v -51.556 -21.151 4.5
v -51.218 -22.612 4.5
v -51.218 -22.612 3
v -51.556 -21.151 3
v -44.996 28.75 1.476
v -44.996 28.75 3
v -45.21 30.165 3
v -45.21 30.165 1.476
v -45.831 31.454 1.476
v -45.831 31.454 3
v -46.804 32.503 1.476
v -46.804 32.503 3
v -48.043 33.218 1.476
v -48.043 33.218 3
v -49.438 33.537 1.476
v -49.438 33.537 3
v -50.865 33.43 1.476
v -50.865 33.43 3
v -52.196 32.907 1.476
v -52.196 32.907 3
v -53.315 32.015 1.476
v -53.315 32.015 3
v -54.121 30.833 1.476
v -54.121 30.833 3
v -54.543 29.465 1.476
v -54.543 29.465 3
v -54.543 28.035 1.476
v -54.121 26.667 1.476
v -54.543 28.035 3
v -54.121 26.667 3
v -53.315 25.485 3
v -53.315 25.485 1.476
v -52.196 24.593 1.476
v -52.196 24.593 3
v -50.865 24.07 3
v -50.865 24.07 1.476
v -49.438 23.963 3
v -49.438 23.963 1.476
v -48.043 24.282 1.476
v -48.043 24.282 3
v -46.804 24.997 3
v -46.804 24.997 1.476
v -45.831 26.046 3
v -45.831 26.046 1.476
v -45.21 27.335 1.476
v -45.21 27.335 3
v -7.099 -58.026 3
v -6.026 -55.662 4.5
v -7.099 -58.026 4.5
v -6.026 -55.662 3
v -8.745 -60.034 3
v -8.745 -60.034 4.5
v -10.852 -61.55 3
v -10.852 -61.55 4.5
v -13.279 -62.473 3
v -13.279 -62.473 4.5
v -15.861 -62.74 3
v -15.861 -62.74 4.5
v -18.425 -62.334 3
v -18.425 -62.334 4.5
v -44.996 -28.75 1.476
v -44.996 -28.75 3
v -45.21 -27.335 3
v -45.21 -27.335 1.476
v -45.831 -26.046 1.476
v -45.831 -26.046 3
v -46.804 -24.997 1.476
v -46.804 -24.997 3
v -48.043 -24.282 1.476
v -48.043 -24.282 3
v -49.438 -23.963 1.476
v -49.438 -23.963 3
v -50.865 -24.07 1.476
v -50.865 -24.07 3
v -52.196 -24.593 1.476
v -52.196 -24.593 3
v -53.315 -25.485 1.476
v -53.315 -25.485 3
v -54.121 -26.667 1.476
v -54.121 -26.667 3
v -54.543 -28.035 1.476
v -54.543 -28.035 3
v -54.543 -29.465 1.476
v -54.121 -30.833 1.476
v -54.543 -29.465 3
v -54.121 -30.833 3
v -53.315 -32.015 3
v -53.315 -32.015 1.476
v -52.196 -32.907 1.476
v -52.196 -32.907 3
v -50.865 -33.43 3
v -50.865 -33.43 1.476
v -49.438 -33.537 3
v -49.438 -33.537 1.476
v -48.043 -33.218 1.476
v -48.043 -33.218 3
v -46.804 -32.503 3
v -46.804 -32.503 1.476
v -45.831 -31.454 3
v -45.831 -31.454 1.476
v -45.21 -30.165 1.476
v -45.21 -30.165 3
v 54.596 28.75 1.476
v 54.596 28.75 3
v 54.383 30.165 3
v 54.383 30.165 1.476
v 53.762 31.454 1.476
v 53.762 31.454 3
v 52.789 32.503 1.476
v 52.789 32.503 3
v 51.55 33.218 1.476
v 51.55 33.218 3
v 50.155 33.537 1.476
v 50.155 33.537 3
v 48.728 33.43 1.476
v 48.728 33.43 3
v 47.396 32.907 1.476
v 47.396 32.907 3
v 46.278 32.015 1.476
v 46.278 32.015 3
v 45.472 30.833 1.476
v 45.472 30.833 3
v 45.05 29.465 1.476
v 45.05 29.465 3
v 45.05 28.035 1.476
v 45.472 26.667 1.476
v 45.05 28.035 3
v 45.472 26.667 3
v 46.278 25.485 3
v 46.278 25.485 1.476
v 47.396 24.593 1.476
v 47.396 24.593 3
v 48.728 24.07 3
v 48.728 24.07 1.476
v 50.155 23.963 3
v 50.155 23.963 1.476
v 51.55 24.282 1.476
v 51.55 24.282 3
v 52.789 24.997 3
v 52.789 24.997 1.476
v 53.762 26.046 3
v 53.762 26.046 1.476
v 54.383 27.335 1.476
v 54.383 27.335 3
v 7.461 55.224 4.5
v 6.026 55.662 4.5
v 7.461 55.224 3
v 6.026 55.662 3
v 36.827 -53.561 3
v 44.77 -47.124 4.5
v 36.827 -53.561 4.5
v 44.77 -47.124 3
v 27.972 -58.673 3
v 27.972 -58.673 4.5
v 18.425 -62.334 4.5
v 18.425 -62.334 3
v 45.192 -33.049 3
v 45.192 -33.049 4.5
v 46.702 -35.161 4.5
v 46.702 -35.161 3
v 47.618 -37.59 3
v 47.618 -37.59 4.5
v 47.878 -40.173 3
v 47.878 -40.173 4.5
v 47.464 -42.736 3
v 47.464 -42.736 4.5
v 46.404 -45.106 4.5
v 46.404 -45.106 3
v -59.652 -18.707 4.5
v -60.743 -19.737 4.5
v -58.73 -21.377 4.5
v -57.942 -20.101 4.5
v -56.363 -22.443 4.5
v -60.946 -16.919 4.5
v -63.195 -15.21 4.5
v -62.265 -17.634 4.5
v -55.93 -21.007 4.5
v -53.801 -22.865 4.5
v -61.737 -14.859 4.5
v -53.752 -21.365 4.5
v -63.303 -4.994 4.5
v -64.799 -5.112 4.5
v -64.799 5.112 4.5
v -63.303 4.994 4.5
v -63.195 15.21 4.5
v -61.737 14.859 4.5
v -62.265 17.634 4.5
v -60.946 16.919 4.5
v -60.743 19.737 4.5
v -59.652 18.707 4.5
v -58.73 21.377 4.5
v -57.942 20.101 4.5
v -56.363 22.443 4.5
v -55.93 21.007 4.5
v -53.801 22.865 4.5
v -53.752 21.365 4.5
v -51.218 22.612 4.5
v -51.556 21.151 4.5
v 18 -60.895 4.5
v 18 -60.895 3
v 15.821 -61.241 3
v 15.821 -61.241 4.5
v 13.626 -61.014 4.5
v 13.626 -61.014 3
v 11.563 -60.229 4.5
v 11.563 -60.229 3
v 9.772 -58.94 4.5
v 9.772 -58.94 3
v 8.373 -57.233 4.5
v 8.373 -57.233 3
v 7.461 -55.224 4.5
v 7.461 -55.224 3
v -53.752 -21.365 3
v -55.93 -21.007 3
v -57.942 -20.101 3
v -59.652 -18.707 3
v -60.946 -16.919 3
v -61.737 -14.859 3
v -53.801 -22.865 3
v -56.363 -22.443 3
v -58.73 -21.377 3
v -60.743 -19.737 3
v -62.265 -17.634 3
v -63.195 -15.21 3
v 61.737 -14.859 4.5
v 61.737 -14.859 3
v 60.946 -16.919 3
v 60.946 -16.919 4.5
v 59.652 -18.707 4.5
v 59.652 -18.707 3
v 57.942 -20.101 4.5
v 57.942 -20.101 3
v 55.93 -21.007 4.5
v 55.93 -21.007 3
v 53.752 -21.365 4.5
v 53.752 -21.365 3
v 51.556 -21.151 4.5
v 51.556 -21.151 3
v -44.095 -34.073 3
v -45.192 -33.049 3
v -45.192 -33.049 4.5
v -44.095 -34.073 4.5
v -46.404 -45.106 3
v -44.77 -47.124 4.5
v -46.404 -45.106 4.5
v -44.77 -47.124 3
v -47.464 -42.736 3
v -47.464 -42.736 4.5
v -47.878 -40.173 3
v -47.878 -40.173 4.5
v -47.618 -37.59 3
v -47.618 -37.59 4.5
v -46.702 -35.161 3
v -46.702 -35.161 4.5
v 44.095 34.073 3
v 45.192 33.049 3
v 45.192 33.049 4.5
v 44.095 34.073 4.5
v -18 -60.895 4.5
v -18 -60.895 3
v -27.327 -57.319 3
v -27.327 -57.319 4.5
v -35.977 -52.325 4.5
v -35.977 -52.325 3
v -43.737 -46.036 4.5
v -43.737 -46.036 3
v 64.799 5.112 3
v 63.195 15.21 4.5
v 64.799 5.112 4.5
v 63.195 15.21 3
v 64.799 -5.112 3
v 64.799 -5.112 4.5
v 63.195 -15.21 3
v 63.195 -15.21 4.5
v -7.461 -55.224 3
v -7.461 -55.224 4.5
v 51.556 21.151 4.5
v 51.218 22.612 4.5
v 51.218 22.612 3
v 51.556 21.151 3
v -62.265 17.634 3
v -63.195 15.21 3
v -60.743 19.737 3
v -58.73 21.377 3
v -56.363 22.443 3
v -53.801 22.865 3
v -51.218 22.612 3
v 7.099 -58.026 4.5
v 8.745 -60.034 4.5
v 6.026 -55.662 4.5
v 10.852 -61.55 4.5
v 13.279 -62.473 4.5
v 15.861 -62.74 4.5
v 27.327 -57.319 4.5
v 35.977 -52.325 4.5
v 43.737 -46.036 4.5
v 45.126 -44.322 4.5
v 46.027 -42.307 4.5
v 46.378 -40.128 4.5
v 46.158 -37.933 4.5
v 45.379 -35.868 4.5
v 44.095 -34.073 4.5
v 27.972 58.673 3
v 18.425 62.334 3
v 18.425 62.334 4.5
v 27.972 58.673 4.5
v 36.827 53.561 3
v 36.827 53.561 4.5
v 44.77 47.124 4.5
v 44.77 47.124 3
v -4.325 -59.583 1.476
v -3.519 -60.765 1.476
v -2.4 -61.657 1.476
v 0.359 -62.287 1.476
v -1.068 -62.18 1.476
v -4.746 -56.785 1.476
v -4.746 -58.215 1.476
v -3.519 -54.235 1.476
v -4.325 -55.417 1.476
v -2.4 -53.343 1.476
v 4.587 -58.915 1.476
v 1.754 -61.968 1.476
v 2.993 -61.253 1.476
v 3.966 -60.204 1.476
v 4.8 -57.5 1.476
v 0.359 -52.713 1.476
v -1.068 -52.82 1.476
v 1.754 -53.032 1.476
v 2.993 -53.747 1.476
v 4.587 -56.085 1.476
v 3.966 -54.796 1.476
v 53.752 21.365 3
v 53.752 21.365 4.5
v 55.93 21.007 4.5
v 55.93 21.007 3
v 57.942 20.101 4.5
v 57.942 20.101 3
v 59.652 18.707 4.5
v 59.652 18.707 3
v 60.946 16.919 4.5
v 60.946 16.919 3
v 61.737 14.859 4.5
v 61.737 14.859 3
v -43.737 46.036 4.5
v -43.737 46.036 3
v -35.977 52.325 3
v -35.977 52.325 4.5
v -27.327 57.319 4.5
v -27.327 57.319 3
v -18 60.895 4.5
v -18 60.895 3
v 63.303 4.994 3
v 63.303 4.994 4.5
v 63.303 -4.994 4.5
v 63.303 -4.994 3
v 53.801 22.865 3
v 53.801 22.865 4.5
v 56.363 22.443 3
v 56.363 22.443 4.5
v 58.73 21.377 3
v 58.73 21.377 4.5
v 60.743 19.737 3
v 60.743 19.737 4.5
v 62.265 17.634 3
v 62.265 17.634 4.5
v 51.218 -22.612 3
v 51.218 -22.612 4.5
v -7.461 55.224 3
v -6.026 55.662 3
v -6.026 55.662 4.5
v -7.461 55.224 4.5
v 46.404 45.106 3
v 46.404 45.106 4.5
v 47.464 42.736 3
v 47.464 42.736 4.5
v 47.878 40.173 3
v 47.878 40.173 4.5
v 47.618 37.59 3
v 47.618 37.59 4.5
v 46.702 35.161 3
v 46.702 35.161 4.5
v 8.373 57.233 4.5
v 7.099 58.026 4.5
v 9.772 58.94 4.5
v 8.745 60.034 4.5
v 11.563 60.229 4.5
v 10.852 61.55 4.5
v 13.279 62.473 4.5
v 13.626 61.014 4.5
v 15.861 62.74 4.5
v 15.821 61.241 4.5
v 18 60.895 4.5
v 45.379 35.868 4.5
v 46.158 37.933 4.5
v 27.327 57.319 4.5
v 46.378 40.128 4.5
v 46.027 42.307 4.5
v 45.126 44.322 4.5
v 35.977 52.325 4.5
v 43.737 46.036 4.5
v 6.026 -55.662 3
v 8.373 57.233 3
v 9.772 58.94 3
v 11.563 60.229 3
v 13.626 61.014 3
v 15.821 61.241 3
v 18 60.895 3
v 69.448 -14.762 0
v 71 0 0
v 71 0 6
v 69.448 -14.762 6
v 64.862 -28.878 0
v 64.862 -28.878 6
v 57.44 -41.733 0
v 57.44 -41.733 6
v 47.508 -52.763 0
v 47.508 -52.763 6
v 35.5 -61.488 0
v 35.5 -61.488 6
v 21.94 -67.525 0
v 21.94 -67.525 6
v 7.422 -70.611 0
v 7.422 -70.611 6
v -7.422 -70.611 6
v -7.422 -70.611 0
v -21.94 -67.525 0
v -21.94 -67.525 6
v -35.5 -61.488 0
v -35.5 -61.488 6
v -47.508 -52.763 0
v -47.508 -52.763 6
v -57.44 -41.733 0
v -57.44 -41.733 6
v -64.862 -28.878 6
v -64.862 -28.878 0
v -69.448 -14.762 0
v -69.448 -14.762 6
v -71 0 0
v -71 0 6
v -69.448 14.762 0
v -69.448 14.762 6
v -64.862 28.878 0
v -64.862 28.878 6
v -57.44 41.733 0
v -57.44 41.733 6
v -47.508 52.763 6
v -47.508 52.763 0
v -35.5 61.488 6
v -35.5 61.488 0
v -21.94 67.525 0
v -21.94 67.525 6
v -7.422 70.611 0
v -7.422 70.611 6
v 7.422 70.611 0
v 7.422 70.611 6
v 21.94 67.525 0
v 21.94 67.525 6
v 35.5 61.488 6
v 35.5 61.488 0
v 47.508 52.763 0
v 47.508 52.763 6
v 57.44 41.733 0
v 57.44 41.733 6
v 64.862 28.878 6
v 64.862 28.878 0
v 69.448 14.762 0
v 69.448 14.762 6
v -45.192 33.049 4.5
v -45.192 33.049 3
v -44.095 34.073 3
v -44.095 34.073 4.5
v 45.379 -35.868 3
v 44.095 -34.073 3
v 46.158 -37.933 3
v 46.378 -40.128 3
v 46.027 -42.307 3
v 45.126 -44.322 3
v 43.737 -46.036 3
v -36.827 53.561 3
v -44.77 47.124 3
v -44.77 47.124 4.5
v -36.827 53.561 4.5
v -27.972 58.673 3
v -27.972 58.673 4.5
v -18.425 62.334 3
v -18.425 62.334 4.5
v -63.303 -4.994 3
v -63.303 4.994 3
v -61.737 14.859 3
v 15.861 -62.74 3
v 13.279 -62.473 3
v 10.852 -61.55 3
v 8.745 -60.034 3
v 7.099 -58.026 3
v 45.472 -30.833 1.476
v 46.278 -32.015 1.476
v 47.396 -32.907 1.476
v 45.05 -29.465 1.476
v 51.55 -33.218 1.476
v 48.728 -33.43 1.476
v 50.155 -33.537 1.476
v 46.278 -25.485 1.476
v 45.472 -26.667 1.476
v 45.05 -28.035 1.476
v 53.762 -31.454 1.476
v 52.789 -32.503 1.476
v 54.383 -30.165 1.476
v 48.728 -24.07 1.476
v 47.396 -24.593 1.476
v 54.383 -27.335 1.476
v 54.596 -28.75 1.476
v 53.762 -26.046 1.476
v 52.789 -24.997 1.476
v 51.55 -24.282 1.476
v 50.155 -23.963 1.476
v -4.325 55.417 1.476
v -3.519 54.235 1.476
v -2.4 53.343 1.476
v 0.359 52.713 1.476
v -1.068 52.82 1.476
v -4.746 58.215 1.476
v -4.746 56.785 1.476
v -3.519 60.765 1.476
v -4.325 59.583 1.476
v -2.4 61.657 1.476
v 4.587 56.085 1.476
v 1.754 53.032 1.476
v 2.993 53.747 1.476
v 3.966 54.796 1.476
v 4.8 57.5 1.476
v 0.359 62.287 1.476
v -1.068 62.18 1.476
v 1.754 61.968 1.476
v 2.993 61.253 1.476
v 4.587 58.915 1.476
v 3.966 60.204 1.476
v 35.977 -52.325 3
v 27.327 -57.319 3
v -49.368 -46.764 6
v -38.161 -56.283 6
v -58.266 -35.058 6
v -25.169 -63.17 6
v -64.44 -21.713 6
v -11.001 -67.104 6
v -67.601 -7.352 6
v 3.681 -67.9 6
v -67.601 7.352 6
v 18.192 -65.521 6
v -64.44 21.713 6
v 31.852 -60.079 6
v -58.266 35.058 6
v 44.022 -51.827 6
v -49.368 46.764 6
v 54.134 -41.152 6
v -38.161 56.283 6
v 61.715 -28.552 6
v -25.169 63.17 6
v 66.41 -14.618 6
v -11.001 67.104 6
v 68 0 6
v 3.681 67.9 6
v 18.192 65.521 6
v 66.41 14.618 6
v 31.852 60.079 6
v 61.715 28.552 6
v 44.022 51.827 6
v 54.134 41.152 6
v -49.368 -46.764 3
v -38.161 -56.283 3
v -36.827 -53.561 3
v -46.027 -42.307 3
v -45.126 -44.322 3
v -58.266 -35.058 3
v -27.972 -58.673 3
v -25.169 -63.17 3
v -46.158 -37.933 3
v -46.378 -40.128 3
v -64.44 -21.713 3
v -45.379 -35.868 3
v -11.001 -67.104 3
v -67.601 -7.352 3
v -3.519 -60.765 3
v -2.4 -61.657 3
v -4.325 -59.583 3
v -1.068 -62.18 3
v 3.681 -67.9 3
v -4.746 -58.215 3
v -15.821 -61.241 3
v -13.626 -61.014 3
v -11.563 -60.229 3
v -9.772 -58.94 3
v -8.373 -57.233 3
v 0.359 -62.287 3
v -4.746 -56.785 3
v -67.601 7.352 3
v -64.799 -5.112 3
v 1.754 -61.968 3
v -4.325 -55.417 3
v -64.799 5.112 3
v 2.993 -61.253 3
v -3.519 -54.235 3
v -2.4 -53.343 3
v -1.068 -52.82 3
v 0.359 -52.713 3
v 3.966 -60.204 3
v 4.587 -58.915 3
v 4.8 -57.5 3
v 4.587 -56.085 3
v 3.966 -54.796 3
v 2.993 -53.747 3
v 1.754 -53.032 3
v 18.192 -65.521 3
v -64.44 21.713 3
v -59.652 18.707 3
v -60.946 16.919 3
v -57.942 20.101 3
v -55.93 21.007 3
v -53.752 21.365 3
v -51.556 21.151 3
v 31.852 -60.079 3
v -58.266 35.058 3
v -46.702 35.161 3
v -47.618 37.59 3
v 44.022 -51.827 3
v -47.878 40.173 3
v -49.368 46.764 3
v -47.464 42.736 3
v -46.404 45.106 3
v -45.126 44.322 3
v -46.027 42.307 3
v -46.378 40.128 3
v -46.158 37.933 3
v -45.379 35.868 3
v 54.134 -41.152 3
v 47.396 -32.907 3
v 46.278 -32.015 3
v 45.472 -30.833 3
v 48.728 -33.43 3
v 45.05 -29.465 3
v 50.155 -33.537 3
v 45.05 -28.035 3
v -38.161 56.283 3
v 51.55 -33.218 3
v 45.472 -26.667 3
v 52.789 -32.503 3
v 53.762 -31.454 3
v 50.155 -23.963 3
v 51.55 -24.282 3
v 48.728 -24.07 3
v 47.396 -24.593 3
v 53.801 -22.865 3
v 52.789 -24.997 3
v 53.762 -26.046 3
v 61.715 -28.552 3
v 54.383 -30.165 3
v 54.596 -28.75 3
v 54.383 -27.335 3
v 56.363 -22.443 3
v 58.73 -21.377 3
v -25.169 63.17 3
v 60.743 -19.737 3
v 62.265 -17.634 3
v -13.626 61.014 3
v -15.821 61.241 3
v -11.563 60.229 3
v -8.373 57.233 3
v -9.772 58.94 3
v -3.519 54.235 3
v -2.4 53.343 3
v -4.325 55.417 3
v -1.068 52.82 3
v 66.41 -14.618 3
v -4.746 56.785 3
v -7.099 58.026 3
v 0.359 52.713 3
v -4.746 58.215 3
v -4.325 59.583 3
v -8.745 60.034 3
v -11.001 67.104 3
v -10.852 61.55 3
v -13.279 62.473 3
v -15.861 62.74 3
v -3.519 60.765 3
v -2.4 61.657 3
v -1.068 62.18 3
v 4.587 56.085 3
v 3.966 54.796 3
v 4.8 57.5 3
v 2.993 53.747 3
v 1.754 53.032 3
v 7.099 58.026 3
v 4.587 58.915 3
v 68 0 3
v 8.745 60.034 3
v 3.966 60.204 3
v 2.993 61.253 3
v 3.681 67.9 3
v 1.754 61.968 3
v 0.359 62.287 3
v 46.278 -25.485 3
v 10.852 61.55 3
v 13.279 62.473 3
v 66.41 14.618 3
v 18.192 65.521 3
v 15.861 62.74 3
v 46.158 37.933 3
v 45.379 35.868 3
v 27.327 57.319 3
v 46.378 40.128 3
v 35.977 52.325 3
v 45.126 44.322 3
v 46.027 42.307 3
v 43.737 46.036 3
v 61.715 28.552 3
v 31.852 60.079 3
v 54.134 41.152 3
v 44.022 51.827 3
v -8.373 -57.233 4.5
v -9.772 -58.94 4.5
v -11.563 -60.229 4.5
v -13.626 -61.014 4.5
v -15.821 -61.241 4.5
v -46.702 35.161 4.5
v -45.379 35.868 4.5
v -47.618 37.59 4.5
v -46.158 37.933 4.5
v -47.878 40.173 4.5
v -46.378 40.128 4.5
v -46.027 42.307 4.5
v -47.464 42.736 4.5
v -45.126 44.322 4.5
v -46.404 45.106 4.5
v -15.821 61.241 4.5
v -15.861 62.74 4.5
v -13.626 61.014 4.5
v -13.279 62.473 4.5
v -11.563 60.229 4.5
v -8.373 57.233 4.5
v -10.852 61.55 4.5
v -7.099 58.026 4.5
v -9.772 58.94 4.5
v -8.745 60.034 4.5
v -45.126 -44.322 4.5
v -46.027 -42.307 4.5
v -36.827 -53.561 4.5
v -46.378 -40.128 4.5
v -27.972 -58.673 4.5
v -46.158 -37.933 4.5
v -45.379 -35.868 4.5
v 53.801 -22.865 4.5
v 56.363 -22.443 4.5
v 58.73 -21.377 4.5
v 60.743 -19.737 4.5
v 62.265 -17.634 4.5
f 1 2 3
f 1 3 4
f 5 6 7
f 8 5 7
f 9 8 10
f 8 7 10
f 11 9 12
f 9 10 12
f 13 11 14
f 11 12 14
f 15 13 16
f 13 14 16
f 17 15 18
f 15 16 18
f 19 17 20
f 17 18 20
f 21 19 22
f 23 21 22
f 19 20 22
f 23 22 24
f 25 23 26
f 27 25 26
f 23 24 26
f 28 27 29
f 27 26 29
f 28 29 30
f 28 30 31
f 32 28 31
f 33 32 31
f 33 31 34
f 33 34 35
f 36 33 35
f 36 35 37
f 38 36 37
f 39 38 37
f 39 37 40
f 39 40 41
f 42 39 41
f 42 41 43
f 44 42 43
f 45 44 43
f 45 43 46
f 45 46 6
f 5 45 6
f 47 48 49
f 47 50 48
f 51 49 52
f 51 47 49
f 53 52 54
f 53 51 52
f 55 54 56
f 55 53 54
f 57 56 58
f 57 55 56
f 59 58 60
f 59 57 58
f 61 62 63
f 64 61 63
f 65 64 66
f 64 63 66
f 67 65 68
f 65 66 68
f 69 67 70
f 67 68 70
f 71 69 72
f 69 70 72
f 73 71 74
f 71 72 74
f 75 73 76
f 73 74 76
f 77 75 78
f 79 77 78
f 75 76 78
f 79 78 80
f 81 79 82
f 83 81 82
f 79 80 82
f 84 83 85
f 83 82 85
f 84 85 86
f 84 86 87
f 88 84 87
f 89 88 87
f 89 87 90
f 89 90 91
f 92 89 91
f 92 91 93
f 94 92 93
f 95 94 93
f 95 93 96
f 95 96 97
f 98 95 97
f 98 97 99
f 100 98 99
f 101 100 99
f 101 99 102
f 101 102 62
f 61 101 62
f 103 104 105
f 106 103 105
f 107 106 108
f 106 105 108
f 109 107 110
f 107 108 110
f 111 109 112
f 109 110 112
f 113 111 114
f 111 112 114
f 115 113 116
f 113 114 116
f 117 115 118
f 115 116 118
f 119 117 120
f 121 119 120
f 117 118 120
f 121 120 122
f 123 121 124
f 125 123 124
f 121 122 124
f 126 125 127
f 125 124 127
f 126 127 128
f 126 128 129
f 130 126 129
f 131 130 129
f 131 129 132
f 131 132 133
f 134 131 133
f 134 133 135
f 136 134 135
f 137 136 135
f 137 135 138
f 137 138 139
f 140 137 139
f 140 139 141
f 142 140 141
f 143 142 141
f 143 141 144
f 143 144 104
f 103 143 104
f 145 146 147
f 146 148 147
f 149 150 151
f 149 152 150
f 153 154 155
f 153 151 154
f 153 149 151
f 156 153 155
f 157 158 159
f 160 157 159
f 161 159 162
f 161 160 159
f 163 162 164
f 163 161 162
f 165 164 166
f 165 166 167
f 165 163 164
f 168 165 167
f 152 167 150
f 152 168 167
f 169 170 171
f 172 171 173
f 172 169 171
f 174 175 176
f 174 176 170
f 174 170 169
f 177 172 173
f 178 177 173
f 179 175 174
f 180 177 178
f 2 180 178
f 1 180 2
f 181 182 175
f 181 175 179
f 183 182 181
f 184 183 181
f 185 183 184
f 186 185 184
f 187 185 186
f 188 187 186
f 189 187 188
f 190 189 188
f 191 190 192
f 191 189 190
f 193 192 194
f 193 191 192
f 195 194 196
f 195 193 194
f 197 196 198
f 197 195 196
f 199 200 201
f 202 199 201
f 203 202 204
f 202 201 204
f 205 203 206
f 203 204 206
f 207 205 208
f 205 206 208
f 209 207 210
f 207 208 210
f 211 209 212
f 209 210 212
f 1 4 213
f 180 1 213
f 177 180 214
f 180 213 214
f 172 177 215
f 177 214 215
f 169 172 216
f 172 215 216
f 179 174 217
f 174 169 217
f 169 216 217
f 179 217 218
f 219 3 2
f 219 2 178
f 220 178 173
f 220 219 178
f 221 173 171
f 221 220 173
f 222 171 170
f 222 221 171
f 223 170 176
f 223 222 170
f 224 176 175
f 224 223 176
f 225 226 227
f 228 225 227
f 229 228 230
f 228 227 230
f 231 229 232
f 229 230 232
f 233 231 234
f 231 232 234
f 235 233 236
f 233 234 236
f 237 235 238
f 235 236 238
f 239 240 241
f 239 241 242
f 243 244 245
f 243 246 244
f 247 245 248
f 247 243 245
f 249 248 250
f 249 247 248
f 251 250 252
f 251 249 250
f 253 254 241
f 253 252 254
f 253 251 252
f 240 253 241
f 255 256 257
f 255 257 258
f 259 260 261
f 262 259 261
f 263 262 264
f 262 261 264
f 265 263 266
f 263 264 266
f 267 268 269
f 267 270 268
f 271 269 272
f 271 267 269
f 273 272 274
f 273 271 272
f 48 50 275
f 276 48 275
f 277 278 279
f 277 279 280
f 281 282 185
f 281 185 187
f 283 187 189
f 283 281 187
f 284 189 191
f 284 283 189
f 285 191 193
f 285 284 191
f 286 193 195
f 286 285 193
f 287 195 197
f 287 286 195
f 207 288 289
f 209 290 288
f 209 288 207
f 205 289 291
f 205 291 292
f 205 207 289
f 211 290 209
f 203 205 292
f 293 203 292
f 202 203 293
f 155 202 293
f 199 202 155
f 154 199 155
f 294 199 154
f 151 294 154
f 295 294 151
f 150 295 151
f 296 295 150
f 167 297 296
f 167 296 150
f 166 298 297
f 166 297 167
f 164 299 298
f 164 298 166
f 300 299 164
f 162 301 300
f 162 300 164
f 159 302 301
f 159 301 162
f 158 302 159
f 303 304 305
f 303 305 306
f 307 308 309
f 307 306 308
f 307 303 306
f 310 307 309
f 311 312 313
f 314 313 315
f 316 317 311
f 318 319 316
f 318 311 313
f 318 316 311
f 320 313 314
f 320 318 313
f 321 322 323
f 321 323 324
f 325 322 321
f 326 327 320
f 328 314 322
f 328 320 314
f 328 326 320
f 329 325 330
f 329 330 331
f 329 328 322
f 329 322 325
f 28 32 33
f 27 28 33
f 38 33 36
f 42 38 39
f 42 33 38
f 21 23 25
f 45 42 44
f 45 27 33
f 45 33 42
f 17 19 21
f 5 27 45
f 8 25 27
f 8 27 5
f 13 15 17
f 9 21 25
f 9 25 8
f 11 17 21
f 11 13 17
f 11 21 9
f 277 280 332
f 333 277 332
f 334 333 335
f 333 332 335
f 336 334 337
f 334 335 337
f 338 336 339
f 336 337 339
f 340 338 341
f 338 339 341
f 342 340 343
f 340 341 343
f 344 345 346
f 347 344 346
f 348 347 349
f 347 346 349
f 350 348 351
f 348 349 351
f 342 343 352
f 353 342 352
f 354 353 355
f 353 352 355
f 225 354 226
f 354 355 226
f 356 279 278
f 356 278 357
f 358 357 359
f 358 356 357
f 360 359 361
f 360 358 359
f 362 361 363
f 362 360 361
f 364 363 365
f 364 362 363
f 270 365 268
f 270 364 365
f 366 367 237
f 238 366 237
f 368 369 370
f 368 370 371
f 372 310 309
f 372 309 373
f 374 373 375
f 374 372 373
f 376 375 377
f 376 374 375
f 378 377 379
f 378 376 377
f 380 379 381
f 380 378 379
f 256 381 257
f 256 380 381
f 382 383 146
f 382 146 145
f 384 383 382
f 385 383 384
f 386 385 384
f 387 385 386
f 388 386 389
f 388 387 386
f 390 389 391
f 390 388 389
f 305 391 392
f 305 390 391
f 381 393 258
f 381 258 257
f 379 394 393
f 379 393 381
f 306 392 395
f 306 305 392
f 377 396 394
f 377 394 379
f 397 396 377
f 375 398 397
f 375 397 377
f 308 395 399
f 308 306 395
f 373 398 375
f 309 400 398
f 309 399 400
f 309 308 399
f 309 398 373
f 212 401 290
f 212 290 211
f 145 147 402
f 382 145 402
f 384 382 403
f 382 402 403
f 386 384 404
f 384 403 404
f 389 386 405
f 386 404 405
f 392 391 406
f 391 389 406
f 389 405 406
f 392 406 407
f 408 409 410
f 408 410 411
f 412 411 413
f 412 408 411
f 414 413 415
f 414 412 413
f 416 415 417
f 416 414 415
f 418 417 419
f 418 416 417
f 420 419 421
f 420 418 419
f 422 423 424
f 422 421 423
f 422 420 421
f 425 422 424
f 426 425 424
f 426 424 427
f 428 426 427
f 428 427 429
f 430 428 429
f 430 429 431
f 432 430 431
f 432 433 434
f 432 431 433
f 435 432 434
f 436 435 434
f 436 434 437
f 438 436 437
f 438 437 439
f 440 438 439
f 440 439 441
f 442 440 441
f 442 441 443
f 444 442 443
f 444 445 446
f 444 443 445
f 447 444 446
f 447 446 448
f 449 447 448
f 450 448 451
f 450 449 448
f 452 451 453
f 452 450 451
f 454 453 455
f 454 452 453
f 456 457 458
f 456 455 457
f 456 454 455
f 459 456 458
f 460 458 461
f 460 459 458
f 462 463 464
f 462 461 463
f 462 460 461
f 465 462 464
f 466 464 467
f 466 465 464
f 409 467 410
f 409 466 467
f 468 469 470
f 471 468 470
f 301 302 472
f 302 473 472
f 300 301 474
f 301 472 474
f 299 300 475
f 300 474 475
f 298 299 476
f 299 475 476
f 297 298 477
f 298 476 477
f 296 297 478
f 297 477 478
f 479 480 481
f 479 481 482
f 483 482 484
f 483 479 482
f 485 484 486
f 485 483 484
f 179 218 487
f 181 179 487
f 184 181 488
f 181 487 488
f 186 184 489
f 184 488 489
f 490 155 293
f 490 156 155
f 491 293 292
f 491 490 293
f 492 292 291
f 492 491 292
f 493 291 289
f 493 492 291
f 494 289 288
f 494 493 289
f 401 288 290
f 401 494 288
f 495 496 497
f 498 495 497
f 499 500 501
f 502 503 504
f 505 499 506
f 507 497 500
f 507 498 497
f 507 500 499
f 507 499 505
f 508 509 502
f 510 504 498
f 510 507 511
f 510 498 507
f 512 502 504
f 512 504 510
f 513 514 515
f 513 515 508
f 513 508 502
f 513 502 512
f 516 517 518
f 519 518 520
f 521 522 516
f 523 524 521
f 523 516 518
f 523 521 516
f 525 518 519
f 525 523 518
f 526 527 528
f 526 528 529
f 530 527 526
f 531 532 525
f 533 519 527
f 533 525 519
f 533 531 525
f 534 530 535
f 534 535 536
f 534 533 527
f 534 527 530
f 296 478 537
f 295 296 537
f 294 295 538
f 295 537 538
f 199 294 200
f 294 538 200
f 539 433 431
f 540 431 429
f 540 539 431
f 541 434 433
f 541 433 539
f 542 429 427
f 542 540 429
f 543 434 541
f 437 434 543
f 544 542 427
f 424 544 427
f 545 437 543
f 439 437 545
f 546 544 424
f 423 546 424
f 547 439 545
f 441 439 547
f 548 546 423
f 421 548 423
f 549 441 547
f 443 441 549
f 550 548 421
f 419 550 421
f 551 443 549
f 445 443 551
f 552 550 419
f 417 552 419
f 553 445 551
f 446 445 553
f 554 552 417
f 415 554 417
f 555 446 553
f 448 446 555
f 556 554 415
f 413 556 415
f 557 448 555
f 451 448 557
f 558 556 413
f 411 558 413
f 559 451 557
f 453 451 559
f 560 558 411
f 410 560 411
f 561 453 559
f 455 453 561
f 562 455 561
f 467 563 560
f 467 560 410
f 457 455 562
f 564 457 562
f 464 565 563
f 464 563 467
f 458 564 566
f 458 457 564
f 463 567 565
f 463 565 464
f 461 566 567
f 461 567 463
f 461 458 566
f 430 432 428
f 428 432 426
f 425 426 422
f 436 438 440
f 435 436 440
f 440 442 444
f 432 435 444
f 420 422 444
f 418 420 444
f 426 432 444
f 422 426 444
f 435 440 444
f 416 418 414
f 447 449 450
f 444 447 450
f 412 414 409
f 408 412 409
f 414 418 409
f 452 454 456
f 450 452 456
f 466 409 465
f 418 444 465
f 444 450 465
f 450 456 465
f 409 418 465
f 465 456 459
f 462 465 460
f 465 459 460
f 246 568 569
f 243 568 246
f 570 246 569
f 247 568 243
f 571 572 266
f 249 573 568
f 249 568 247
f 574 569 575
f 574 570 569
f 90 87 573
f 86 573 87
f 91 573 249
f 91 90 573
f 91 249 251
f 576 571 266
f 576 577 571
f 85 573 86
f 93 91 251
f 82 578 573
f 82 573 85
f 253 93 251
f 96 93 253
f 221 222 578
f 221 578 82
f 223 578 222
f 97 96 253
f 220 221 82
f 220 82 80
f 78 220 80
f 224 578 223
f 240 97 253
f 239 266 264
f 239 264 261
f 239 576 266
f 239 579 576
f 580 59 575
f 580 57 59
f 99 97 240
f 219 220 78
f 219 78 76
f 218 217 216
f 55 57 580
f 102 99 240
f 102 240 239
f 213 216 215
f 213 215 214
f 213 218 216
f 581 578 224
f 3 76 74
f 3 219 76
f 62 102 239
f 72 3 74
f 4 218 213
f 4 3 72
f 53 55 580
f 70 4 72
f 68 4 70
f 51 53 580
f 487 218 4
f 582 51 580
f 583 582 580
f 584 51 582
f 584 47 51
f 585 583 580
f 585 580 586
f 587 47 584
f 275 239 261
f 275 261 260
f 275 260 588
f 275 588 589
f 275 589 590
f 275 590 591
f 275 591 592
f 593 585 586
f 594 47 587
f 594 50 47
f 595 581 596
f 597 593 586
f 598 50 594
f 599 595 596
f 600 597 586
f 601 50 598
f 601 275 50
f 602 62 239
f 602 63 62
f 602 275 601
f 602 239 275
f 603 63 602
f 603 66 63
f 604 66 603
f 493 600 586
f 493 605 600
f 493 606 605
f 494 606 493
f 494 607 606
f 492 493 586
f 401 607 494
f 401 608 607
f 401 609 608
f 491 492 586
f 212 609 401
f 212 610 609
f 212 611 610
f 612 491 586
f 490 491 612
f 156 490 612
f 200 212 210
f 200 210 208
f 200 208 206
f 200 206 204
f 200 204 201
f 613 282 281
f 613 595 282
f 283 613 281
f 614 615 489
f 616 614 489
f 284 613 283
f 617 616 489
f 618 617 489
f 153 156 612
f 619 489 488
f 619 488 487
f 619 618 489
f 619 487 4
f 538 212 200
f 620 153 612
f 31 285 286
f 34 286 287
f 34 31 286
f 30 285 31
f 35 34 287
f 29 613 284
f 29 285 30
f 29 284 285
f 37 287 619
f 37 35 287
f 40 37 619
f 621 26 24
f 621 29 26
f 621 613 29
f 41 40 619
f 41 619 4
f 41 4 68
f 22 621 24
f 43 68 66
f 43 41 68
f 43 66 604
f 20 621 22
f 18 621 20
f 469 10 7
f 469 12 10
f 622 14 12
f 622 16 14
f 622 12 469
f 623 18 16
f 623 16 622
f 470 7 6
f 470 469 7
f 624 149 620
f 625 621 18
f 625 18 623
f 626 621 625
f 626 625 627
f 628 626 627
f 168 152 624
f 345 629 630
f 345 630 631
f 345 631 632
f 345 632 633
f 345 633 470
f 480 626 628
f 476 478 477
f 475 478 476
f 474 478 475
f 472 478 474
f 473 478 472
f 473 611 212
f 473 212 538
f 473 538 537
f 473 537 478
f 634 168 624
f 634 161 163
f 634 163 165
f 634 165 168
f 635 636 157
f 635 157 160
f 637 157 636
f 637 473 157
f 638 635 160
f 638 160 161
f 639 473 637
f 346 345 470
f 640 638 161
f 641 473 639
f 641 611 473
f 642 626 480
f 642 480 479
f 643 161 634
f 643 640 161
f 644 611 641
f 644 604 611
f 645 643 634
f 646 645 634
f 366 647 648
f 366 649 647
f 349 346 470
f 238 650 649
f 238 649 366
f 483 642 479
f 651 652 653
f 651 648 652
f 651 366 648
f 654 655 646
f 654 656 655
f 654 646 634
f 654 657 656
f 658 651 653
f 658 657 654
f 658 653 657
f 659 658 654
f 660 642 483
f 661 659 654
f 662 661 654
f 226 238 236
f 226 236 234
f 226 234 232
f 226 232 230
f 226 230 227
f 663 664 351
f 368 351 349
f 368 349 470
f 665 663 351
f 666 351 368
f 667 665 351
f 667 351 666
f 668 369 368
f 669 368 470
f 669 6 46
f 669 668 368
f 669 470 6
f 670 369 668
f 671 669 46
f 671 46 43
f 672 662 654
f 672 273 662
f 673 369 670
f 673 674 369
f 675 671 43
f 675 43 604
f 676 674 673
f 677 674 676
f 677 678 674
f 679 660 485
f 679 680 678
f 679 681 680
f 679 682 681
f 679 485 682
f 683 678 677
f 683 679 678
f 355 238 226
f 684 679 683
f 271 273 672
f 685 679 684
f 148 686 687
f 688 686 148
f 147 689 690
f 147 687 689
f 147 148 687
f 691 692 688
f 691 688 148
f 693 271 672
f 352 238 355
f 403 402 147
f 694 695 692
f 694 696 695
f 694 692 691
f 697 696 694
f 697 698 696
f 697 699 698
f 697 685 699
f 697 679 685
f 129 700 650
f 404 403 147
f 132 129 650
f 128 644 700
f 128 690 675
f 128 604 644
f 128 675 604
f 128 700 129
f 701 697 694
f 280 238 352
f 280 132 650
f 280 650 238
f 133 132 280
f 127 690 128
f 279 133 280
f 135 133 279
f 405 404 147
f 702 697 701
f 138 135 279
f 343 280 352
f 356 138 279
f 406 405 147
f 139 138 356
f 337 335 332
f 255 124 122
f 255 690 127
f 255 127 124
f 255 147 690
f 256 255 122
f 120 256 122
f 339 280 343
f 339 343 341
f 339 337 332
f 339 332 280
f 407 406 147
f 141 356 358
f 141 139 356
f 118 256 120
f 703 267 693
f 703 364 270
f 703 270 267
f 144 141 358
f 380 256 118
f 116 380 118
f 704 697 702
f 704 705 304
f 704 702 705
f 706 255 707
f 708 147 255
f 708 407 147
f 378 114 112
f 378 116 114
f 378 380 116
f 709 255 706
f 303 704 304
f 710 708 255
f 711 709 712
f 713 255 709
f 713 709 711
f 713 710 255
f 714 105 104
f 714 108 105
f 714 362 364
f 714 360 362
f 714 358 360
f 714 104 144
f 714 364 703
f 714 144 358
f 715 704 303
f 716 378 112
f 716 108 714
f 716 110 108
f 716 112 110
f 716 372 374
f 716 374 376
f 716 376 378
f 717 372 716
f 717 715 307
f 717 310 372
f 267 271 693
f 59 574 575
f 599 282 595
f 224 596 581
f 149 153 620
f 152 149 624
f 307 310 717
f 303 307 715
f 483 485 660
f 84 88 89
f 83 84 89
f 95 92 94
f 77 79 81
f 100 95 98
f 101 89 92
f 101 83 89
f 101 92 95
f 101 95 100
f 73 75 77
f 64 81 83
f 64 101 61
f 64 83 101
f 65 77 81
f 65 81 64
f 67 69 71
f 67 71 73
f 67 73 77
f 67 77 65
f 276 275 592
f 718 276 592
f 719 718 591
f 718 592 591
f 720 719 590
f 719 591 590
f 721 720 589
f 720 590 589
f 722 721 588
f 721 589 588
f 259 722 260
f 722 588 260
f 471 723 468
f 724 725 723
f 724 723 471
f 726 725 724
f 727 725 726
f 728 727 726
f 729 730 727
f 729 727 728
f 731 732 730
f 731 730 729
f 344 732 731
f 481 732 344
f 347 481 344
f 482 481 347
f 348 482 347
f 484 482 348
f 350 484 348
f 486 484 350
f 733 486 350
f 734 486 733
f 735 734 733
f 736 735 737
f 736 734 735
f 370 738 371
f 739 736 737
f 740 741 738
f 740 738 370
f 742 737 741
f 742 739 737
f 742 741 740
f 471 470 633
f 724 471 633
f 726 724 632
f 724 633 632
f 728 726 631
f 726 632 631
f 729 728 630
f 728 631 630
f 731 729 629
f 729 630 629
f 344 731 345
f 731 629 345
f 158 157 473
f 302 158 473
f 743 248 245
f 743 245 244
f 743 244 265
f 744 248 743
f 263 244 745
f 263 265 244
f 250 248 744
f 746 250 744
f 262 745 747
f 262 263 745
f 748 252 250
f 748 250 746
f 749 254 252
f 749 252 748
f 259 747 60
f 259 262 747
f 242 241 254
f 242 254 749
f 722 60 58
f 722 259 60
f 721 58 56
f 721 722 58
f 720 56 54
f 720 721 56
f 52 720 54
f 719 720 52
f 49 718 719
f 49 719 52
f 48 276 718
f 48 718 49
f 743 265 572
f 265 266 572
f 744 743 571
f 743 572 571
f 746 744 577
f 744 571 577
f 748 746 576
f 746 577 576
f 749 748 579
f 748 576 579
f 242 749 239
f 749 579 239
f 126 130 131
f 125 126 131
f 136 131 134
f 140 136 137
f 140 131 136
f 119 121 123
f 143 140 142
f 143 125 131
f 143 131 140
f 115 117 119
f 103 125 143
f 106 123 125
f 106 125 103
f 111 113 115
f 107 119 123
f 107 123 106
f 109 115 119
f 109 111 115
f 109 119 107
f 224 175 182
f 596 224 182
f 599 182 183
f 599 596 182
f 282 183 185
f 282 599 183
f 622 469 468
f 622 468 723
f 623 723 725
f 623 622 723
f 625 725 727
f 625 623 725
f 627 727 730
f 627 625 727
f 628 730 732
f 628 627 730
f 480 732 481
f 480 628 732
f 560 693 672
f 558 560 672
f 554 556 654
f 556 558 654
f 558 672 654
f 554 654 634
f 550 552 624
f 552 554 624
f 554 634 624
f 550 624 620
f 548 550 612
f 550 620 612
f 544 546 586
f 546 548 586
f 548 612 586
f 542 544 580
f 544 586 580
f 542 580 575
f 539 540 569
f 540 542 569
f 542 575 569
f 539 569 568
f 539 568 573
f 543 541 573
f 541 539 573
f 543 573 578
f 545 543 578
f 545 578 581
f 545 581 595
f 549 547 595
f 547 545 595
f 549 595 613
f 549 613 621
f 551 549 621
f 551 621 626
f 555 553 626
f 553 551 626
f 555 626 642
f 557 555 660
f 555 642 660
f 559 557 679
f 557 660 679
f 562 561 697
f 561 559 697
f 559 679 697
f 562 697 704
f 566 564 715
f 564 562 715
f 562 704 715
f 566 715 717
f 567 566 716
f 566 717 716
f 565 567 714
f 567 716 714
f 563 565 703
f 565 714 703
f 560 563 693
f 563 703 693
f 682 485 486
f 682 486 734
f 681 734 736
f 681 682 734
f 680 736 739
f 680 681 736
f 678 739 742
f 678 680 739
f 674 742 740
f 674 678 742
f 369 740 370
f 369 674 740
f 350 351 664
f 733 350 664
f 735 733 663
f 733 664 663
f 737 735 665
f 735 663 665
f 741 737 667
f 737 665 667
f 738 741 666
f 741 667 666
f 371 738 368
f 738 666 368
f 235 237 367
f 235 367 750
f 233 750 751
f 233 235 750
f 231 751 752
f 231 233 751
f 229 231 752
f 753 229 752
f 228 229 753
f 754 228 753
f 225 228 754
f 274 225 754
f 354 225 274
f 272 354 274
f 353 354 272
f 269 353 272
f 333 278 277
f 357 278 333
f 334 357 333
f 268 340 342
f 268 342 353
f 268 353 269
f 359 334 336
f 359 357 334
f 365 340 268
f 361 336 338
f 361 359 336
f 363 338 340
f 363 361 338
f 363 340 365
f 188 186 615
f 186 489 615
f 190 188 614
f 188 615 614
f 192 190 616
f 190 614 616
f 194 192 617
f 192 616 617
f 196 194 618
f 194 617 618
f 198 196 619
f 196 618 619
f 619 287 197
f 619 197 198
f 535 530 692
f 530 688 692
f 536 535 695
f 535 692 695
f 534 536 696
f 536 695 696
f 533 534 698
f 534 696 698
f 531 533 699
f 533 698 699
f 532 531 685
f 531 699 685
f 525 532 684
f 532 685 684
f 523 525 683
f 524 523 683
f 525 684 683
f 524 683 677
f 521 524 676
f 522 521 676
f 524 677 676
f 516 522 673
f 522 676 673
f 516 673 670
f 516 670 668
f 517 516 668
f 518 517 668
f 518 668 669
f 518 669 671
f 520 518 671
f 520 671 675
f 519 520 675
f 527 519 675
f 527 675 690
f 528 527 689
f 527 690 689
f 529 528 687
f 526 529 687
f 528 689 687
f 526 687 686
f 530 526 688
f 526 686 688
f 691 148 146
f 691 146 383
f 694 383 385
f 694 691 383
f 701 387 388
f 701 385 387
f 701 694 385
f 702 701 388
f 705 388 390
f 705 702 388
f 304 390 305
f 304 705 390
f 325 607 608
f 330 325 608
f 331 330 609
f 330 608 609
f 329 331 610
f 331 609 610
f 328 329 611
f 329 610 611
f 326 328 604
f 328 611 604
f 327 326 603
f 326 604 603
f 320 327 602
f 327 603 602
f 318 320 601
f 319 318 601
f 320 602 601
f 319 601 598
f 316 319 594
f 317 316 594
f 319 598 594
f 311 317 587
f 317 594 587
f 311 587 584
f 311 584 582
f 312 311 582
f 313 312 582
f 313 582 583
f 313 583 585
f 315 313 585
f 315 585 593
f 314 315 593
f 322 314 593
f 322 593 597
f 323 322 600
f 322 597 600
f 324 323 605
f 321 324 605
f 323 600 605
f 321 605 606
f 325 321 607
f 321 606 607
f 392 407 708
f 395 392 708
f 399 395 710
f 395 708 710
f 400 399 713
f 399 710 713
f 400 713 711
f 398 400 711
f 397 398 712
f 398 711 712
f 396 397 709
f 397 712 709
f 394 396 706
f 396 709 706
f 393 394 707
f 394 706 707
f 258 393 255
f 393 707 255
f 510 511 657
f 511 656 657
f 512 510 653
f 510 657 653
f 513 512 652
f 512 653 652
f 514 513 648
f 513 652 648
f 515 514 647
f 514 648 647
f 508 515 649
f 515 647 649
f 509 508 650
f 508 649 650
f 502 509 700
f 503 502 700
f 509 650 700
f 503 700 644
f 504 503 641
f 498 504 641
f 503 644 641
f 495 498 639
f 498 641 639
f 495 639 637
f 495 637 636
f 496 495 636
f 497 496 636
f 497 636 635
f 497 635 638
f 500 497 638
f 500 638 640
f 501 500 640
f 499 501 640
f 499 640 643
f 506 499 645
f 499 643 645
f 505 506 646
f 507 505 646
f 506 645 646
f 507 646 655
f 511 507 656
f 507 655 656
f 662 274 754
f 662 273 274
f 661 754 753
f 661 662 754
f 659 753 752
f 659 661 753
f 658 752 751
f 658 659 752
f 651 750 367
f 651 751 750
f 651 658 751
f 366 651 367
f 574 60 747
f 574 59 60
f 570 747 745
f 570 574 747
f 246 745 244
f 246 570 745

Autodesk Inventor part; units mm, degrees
ref_plane "YZ Plane" through (0, 0, 0) normal (1, 0, 0) x (0, 1, 0)
ref_plane "XZ Plane" through (0, 0, 0) normal (0, 1, 0) x (-1, 0, 0)
ref_plane "XY Plane" through (0, 0, 0) normal (0, 0, 1) x (1, 0, 0)
sketch "Sketch3" plane through (0, 0, 0) normal (0, 0, 1) x (1, 0, 0)
  circle A0 centre (0, 0) radius 68
  circle A1 centre (0, 0) radius 65
  circle A2 centre (0, 0) radius 71
  dimension "d27" = 136
  dimension "d28" = 130
  dimension "d29" = 142
extrude "Extrusion3" add sketch "Sketch3" along normal blind 3 contours A0 | A1 | A2
sketch "Sketch4" plane through (0, 0, 3) normal (0, 0, 1) x (1, 0, 0)
  circle A0 centre (0, 0) radius 71 projected
  line L0 (0, 0) -> (0, 63.1147) construction
  circle A1 centre (0, 57.5) radius 4.8
  circle A2 centre (-49.7965, 28.75) radius 4.8
  circle A3 centre (-49.7965, -28.75) radius 4.8
  circle A4 centre (0, -57.5) radius 4.8
  circle A5 centre (49.7965, -28.75) radius 4.8
  circle A6 centre (49.7965, 28.75) radius 4.8
  dimension "d32" = 9.6
  dimension "d33" = 57.5
  dimension "d36" = 360
extrude "Extrusion4" cut sketch "Sketch4" against normal blind 1.524 contours A1 | A2 | A3 | A4 | A5 | A6
sketch "Sketch5" plane through (0, 0, 3) normal (0, 0, 1) x (1, 0, 0)
  circle A0 centre (49.7965, -28.75) radius 4.8 projected
  circle A1 centre (-49.7965, 28.75) radius 4.8 projected
  circle A2 centre (49.7965, 28.75) radius 4.8 projected
  circle A3 centre (0, -57.5) radius 4.8 projected
  circle A4 centre (-49.7965, -28.75) radius 4.8 projected
  circle A5 centre (0, 57.5) radius 4.8 projected
  circle A6 centre (0, 0) radius 71 projected
  circle A7 centre (0, 57.5) radius 6.3
  circle A8 centre (-49.7965, 28.75) radius 6.3
  circle A9 centre (-49.7965, -28.75) radius 6.3
  circle A10 centre (0, -57.5) radius 6.3
  circle A11 centre (49.7965, -28.75) radius 6.3
  circle A12 centre (49.7965, 28.75) radius 6.3
  circle A13 centre (0, 0) radius 65
  circle A14 centre (-15.5907, 52.744) radius 10
  circle A15 centre (15.5907, 52.744) radius 10
  circle A16 centre (-37.8823, 39.874) radius 10
  circle A17 centre (-53.473, 12.87) radius 10
  circle A18 centre (-53.473, -12.87) radius 10
  circle A19 centre (-37.8823, -39.874) radius 10
  circle A20 centre (-15.5907, -52.744) radius 10
  circle A21 centre (15.5907, -52.744) radius 10
  circle A22 centre (37.8823, -39.874) radius 10
  circle A23 centre (53.473, -12.87) radius 10
  circle A24 centre (53.473, 12.87) radius 10
  circle A25 centre (37.8823, 39.874) radius 10
  circle A26 centre (-15.5907, 52.744) radius 8.5
  circle A27 centre (-37.8823, 39.874) radius 8.5
  arc A28 (-18.0002, 60.8953) -> (-43.7368, 46.0363) centre (0, 0) ccw
  line L0 (-45.1916, 33.0494) -> (-44.0952, 34.0731)
  line L1 (-6.0259, 55.6618) -> (-7.4606, 55.2241)
  line L2 (-51.2175, 22.6123) -> (-51.5558, 21.151)
  arc A29 (-61.737, 14.859) -> (-61.737, -14.859) centre (0, 0) ccw
  line L3 (-51.2175, -22.6123) -> (-51.5558, -21.151)
  circle A30 centre (-53.473, -12.87) radius 8.5
  circle A31 centre (-53.473, 12.87) radius 8.5
  line L4 (-45.1916, -33.0494) -> (-44.0952, -34.0731)
  arc A32 (-43.7368, -46.0363) -> (-18.0002, -60.8953) centre (0, 0) ccw
  line L5 (-6.0259, -55.6618) -> (-7.4606, -55.2241)
  circle A33 centre (-15.5907, -52.744) radius 8.5
  circle A34 centre (-37.8823, -39.874) radius 8.5
  line L6 (6.0259, -55.6618) -> (7.4606, -55.2241)
  arc A35 (18.0002, -60.8953) -> (43.7368, -46.0363) centre (0, 0) ccw
  line L7 (45.1916, -33.0494) -> (44.0952, -34.0731)
  circle A36 centre (37.8823, -39.874) radius 8.5
  circle A37 centre (15.5907, -52.744) radius 8.5
  line L8 (51.2175, -22.6123) -> (51.5558, -21.151)
  arc A38 (61.737, -14.859) -> (61.737, 14.859) centre (0, 0) ccw
  line L9 (51.2175, 22.6123) -> (51.5558, 21.151)
  circle A39 centre (53.473, 12.87) radius 8.5
  circle A40 centre (53.473, -12.87) radius 8.5
  line L10 (45.1916, 33.0494) -> (44.0952, 34.0731)
  arc A41 (43.7368, 46.0363) -> (18.0002, 60.8953) centre (0, 0) ccw
  line L11 (6.0259, 55.6618) -> (7.4606, 55.2241)
  circle A42 centre (15.5907, 52.744) radius 8.5
  circle A43 centre (37.8823, 39.874) radius 8.5
  point P0 (-63.1954, 15.2101)
  point P1 (-63.1954, -15.2101)
  point P2 (-45.1916, -33.0494)
  point P3 (-44.77, -47.1238)
  point P4 (-18.4254, -62.3338)
  point P5 (-6.0259, -55.6618)
  point P6 (6.0259, -55.6618)
  point P7 (18.4254, -62.3338)
  point P8 (44.77, -47.1238)
  point P9 (45.1916, -33.0494)
  point P10 (63.1954, -15.2101)
  point P11 (63.1954, 15.2101)
  point P12 (51.2175, 22.6123)
  point P13 (45.1916, 33.0494)
  point P14 (44.77, 47.1238)
  point P15 (18.4254, 62.3338)
  point P16 (6.0259, 55.6618)
  point P17 (-18.4254, 62.3338)
  point P18 (-44.77, 47.1238)
  dimension "d46" = 20
  dimension "d40" = 1.5
  dimension "d43" = 360
  dimension "d45" = 130
  dimension "d47" = 20
  dimension "d50" = 360
  dimension "d52" = 1.5
  dimension "d53" = 1.5
  dimension "d56" = 360
extrude "Extrusion5" add sketch "Sketch5" along normal blind 1.5 contours L1 A26 A28 A14 | A15 A41 A42 L11 | A14 A28 A16 A13 | A13 A25 A41 A15 | A16 A28 A27 L0 | A25 L10 A43 A41 | A17 A29 A18 A13 | A17 L2 A31 A29 | A13 A23 A38 A24 | A24 A38 A39 L9 | A18 A29 A30 L3 | A19 A32 A20 A13 | A19 L4 A34 A32 | A23 L8 A40 A38 | A20 A32 A33 L5 | A13 A21 A35 A22 | A22 A35 A36 L7 | A21 L6 A37 A35 picked at (-10.8394, 60.9083) picked at (10.8394, 60.9083) picked at (-44.9035, 46.1933) picked at (47.256, 41.1158) picked at (-62.4563, 15.7909) picked at (62.2412, 16.3841) picked at (-62.2412, -16.3841) picked at (-45.2691, -33.9863) picked at (62.4563, -15.7909) picked at (-10.8394, -60.9083) picked at (44.8652, -46.2495) picked at (10.8394, -60.9083)
sketch "Sketch6" plane through (0, 0, 3) normal (0, 0, 1) x (1, 0, 0)
  circle A0 centre (0, 0) radius 71 projected
  circle A1 centre (0, 0) radius 68
  dimension "d60" = 136
extrude "Extrusion6" add sketch "Sketch6" along normal blind 3
equation "\"d47\" = d46"
equation "\"d53\" = d52"
properties part number "Bottom Lid"
